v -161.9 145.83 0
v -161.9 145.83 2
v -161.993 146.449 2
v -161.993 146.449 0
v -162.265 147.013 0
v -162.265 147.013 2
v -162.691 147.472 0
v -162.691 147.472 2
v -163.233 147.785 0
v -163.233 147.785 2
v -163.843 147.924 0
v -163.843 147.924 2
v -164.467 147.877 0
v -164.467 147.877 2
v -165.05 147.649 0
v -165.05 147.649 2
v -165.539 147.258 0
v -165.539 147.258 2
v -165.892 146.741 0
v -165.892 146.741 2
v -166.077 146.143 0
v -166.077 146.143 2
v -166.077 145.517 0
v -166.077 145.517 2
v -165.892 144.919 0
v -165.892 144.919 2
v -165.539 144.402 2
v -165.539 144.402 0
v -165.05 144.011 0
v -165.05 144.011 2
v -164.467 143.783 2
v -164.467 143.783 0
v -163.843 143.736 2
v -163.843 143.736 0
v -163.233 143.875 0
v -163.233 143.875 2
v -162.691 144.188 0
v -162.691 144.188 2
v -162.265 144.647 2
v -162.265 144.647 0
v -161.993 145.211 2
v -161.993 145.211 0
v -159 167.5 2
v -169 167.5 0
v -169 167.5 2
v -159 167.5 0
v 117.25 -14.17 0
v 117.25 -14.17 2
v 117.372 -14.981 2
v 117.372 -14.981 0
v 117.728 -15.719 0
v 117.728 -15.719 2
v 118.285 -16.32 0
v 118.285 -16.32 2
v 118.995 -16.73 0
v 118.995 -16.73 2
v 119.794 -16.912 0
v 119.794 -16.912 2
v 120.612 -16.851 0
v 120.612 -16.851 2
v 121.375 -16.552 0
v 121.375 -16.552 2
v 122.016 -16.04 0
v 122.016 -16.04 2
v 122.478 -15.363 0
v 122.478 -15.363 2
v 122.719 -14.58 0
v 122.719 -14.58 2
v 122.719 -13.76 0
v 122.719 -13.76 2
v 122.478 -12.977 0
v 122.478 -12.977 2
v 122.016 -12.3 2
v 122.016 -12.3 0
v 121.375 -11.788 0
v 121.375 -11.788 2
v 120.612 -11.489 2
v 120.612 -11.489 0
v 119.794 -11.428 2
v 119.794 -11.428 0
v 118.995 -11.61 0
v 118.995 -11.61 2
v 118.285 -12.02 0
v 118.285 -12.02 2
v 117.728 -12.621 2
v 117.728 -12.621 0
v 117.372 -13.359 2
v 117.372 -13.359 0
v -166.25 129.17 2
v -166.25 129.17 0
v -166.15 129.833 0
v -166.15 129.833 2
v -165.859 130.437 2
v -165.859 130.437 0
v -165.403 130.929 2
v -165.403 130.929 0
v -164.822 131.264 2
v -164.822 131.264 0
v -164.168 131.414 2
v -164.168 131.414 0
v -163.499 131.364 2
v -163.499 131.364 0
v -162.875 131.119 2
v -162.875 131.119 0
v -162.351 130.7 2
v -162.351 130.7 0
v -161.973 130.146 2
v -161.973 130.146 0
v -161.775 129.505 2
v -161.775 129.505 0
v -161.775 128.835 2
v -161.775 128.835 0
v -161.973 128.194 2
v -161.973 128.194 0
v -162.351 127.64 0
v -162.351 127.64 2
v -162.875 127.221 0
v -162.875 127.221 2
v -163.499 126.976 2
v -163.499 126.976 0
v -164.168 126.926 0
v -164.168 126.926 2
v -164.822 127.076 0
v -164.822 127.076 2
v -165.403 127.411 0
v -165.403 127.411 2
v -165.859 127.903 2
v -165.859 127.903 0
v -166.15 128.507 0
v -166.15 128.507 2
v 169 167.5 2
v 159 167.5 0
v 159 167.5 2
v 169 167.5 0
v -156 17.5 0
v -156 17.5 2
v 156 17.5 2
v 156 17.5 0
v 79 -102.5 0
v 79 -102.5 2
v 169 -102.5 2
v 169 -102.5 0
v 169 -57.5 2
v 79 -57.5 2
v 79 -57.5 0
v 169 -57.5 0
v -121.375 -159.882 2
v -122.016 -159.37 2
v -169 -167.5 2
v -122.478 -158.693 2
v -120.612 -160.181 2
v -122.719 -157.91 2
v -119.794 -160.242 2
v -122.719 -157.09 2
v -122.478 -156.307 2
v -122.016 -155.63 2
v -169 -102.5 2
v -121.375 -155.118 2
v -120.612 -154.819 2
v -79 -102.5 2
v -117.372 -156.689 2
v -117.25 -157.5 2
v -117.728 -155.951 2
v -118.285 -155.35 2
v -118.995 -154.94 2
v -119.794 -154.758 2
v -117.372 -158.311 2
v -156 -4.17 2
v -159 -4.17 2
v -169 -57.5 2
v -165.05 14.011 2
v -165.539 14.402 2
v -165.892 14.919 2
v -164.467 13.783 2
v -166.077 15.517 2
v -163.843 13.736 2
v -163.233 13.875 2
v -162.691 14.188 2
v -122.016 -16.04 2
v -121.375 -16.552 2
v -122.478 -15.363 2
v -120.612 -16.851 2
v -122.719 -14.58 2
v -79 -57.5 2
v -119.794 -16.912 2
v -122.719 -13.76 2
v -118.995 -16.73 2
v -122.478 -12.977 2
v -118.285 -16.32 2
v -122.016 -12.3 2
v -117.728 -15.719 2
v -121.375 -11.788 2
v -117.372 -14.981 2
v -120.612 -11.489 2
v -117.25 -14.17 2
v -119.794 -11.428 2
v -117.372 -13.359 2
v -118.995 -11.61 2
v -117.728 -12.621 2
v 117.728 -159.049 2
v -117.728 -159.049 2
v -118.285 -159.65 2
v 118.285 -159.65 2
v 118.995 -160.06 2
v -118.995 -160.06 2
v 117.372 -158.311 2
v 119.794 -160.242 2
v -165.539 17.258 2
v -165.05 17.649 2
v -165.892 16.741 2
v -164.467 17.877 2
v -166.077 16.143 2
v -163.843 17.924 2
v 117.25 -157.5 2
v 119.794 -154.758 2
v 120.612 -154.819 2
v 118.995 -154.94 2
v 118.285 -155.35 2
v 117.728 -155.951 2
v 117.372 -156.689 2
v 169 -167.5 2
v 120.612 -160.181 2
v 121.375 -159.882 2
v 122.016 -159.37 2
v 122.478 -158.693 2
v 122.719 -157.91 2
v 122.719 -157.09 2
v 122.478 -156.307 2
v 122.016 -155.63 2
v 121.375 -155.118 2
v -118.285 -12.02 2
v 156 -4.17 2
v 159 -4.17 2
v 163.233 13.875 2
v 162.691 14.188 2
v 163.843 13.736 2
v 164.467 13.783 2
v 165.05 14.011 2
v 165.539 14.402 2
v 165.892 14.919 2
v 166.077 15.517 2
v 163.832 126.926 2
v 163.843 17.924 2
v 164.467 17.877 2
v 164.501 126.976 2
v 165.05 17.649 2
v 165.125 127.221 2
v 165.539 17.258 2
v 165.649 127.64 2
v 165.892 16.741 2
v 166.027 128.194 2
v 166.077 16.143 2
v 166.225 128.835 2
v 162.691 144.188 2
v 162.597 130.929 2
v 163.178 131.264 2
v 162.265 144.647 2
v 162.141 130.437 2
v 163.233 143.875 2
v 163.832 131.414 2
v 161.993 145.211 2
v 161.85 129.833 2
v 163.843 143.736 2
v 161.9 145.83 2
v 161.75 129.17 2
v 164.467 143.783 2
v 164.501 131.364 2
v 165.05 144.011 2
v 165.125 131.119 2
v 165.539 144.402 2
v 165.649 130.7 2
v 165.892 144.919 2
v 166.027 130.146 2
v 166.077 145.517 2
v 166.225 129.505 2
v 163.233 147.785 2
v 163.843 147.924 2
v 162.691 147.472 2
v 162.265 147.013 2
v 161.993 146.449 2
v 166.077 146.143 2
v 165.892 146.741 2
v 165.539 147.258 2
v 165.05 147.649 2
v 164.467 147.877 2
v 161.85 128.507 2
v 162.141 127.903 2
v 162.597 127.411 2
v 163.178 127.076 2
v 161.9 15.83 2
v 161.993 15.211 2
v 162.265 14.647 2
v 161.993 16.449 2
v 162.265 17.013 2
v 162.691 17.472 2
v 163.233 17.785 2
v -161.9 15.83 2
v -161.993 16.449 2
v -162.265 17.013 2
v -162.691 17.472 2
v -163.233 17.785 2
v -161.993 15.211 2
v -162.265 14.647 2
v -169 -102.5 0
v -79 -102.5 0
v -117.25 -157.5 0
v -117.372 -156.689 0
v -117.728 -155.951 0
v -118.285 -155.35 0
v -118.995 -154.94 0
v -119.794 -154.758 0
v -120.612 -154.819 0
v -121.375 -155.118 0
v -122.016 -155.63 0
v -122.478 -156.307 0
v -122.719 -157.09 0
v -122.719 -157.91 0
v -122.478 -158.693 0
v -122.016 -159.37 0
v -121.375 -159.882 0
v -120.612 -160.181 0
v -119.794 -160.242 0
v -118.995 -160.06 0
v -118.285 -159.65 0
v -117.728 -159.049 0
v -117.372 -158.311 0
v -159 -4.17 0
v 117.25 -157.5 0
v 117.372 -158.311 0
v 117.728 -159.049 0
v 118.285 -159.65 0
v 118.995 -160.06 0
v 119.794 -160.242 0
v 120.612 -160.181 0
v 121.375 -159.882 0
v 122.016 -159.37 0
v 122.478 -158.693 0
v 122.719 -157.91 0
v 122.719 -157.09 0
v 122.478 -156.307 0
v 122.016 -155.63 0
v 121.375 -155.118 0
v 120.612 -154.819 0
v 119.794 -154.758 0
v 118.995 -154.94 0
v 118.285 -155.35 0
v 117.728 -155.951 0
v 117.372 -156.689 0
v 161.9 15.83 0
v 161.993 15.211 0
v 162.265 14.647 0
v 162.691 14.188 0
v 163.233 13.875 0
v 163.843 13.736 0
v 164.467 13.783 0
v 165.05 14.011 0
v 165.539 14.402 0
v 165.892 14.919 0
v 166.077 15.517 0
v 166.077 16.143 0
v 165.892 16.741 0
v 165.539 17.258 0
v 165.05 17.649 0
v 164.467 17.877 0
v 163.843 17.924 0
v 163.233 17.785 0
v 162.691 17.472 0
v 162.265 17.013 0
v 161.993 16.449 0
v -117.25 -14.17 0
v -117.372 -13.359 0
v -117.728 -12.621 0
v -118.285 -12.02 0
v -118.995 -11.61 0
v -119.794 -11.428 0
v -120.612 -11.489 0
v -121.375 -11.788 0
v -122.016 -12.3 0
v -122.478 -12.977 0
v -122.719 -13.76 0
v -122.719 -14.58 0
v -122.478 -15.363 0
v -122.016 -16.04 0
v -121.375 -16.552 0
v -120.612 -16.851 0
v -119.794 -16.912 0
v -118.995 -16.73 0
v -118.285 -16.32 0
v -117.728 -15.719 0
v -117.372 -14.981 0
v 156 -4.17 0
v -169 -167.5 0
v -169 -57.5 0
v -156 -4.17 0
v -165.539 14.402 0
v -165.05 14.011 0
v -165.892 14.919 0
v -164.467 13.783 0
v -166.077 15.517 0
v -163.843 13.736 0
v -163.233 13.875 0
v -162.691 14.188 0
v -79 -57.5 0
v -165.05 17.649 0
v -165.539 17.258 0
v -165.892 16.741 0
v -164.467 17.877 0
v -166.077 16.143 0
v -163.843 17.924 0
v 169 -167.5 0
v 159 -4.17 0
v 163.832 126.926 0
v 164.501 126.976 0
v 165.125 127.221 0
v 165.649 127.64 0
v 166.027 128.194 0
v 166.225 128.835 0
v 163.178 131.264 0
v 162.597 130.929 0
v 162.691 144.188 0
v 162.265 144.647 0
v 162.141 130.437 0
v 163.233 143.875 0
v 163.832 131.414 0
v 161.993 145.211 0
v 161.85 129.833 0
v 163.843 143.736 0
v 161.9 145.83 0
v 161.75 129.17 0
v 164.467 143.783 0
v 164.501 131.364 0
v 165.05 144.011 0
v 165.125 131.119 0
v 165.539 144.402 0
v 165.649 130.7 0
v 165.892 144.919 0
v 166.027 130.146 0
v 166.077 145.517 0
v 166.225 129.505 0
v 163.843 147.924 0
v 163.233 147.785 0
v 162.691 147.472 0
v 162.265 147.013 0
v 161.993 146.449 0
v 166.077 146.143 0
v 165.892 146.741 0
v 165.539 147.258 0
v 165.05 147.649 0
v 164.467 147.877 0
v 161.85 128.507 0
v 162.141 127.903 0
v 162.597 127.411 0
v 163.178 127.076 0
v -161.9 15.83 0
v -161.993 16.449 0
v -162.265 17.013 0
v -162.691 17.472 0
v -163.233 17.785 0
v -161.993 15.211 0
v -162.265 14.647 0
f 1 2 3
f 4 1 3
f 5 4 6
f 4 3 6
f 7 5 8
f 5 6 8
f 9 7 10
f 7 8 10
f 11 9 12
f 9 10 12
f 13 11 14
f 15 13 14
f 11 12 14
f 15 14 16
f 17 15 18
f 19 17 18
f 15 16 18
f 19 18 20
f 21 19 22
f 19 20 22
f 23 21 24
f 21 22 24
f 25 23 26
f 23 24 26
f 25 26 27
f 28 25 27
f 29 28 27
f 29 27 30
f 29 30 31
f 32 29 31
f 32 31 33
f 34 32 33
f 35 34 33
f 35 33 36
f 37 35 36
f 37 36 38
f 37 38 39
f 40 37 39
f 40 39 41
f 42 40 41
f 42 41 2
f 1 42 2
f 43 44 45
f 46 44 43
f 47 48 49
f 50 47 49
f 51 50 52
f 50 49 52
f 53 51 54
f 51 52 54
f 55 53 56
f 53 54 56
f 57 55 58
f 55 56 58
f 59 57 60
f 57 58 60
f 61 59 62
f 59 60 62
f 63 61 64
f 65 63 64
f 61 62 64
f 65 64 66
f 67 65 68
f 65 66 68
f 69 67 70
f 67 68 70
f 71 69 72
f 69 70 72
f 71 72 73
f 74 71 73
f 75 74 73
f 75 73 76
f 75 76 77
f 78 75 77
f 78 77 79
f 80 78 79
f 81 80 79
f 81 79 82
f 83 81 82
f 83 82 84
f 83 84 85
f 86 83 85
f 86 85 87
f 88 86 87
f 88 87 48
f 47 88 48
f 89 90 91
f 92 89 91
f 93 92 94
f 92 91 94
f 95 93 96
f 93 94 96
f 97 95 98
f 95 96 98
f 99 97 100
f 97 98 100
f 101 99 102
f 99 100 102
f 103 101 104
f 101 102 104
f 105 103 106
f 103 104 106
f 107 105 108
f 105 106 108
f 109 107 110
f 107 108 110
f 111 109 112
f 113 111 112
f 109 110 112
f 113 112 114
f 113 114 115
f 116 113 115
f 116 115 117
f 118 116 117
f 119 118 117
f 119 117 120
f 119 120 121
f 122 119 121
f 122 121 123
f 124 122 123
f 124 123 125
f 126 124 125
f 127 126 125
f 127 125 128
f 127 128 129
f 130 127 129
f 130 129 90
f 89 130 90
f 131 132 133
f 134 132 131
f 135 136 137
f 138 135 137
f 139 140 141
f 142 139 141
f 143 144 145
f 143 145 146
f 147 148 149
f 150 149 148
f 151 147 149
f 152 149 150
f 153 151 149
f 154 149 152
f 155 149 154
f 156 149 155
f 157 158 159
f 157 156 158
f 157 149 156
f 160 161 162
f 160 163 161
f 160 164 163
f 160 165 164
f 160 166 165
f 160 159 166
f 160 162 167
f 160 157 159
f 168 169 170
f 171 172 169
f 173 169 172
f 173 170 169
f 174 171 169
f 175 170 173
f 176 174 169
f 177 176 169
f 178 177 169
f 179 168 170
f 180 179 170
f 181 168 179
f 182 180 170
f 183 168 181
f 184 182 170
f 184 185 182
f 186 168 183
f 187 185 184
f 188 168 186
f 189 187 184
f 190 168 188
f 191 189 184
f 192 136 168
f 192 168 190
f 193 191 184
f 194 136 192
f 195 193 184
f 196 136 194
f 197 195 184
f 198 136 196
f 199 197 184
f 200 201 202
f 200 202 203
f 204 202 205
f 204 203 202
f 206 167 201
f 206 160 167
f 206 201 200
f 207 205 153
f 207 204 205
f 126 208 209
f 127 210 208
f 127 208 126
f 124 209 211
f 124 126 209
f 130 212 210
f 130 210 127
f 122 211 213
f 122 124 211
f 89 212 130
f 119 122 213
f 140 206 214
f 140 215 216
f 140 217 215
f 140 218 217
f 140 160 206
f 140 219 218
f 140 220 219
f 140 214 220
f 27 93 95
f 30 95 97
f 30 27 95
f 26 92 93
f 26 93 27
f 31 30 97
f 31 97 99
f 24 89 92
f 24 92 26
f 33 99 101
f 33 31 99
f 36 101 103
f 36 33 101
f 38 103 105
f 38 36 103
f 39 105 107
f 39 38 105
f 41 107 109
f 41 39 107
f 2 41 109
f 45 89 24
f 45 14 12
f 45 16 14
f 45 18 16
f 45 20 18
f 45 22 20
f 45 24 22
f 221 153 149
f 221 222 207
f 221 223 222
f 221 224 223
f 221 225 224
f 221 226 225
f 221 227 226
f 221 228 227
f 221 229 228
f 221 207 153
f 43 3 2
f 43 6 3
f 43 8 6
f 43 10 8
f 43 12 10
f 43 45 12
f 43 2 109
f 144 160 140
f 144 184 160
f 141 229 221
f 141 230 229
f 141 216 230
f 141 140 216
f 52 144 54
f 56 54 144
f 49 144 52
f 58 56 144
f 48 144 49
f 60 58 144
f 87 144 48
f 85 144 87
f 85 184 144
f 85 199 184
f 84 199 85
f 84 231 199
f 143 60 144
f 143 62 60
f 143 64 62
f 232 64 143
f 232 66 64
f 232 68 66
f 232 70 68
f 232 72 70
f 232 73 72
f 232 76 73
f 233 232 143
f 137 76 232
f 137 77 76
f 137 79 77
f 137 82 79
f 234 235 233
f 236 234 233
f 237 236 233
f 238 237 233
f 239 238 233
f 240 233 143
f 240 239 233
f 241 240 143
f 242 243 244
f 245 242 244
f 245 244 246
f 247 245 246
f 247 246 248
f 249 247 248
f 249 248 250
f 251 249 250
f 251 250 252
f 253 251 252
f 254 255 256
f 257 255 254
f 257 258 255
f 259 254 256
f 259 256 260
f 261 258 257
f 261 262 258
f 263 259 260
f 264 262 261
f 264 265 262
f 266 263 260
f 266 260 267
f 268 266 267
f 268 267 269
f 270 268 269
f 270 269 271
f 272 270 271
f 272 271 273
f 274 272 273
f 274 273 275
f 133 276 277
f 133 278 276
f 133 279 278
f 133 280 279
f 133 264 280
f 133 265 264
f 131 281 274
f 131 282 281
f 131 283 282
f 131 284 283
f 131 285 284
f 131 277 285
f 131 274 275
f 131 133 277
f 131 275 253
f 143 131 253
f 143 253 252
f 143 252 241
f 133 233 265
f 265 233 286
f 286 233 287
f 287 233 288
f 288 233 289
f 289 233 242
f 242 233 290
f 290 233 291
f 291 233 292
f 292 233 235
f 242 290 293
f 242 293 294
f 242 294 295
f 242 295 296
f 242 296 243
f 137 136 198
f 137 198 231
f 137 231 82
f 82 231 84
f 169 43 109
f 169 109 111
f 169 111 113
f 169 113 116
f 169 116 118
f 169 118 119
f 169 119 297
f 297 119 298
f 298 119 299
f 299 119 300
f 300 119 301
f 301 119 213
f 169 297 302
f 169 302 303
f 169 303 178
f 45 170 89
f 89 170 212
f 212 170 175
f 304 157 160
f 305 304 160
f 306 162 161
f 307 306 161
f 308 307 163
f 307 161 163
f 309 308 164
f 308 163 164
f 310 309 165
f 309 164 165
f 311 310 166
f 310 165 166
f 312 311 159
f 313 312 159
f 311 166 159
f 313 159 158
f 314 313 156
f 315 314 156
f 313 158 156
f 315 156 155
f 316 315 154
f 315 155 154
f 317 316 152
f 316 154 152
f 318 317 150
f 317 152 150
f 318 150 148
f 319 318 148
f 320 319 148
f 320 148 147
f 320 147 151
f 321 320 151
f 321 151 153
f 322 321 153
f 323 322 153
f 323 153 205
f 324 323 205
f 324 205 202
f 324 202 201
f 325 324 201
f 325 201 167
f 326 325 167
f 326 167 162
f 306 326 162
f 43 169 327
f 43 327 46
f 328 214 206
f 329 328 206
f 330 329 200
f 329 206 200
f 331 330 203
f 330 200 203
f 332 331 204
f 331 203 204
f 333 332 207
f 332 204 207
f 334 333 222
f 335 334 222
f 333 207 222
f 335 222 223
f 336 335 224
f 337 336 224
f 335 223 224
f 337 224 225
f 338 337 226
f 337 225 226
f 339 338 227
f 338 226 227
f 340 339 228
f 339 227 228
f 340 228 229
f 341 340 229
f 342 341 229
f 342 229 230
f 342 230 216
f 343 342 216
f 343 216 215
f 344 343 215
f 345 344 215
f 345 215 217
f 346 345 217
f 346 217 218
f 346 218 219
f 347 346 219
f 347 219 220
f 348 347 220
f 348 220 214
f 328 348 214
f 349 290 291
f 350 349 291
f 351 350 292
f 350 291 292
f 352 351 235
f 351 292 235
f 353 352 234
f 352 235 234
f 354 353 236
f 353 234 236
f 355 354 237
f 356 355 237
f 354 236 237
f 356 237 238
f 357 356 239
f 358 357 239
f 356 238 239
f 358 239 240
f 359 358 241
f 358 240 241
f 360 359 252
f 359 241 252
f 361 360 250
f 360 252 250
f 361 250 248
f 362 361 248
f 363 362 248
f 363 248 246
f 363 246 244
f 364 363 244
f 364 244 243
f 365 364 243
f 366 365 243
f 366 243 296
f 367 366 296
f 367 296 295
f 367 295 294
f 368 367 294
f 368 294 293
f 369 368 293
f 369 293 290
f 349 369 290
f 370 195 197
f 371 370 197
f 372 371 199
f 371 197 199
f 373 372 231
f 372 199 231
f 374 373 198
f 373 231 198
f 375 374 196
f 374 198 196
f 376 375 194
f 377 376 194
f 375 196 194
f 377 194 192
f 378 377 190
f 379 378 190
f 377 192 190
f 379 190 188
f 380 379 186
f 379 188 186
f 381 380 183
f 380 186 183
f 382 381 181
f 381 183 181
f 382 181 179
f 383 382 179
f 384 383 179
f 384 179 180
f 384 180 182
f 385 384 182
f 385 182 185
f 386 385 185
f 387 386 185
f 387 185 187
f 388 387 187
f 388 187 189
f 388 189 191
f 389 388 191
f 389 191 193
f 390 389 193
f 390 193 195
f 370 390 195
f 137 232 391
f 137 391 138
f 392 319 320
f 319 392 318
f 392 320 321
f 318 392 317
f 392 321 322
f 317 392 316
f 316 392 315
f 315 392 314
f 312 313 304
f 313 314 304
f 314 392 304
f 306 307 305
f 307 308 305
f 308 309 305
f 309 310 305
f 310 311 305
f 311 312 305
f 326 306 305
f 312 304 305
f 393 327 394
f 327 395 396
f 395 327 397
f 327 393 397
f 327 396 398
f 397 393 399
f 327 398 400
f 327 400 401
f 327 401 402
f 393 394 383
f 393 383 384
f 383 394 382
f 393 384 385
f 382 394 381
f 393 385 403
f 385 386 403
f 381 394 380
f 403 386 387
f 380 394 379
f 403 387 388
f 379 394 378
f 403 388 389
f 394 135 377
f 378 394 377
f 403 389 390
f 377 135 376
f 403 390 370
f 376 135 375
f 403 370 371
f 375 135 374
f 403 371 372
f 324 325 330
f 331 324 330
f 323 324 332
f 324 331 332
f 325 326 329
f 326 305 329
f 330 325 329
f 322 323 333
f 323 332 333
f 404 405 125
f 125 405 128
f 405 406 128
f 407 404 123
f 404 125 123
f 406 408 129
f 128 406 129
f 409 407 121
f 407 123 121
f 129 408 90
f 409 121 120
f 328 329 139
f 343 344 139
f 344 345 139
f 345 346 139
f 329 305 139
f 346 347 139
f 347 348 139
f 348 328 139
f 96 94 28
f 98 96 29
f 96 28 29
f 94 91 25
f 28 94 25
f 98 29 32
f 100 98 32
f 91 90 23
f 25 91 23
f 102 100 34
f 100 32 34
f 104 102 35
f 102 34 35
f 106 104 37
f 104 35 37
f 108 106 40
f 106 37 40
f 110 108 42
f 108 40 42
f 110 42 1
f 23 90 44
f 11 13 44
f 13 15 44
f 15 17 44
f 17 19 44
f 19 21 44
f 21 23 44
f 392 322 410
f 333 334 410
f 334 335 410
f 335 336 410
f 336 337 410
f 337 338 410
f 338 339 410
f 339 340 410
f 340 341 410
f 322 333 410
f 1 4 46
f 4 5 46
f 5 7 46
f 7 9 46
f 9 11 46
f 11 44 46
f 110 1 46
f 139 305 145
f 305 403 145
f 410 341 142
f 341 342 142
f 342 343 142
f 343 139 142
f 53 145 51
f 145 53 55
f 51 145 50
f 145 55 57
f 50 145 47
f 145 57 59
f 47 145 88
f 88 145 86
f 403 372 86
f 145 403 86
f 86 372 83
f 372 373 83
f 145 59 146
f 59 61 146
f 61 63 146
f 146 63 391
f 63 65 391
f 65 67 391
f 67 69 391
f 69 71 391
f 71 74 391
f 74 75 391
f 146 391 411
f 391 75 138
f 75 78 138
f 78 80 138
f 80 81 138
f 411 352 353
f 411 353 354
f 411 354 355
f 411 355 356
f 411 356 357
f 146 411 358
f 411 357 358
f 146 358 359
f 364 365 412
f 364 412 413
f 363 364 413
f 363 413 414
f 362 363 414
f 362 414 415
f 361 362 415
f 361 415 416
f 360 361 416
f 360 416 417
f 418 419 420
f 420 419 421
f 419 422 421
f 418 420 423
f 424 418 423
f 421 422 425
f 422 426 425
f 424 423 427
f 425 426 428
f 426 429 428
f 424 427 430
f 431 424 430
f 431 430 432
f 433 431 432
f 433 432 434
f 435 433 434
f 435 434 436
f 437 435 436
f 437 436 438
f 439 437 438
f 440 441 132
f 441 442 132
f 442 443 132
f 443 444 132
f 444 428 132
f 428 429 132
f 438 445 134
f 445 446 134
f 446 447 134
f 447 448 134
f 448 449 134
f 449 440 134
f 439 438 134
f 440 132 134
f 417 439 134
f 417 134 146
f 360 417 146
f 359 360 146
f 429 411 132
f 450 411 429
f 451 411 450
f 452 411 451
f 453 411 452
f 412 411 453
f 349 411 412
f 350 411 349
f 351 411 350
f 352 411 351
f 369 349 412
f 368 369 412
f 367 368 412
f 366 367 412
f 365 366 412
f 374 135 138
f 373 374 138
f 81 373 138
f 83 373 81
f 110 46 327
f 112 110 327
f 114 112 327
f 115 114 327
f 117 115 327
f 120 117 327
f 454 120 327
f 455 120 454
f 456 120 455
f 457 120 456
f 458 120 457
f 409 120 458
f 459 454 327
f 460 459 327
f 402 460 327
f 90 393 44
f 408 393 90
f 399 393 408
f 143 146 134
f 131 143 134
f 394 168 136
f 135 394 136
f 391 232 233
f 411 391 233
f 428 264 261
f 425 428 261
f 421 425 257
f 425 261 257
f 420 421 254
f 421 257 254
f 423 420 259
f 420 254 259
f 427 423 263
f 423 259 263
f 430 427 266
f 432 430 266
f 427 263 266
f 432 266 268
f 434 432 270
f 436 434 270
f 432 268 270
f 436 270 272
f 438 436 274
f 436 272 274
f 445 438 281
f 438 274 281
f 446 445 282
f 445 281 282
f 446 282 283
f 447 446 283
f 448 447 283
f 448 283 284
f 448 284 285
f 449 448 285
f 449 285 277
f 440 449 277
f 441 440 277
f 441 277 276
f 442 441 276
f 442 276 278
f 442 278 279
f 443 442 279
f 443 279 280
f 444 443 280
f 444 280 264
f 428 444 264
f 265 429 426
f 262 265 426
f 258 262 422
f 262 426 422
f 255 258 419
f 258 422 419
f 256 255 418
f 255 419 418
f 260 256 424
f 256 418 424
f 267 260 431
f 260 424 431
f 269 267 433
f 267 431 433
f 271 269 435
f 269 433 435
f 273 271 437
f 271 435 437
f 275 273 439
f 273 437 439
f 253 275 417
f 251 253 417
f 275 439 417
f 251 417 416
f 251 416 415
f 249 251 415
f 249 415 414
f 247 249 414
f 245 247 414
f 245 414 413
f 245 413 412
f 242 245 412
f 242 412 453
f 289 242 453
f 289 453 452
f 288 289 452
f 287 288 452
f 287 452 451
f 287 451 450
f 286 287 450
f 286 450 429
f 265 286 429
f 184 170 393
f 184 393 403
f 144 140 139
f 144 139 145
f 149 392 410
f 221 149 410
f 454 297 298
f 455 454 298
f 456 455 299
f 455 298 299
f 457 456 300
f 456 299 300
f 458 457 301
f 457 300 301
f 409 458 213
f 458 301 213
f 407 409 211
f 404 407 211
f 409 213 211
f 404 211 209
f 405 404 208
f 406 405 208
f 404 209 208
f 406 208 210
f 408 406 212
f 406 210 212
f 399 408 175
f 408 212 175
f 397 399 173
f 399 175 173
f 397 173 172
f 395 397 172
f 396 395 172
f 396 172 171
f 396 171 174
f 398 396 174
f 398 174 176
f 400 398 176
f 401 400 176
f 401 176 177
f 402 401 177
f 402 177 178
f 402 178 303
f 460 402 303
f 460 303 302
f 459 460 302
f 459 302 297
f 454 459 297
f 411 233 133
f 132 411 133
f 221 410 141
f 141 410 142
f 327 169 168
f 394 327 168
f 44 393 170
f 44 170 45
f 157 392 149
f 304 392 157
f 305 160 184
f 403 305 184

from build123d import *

# Parameters (mm, degrees)
ESQUISSE1_W             = 338
ESQUISSE1_H             = 335
BOSS_EXTRU_1_DEPTH      = 2
ESQUISSE2_W             = 318
ESQUISSE2_H             = 150
ESQUISSE2_W_2           = 90
ESQUISSE2_H_2           = 45
ENL_V_MAT_EXTRU_1_DEPTH = 238.952201082
D_GAGEMENT_M41_D        = 4.5
ESQUISSE5_W             = 3
ESQUISSE5_H             = 21.67
ENL_V_MAT_EXTRU_2_DEPTH = 238.952201082
ESQUISSE6_R             = 2.1
ENL_V_MAT_EXTRU_3_DEPTH = 238.952201082
ESQUISSE7_R             = 2.75
ENL_V_MAT_EXTRU_4_DEPTH = 238.952201082


with BuildPart() as part:
    # Esquisse1 → Boss.-Extru.1 (new body)
    with BuildSketch(Plane.XY):
        Rectangle(ESQUISSE1_W, ESQUISSE1_H)
    extrude(amount=BOSS_EXTRU_1_DEPTH)

    # Esquisse2 → Enlèv. mat.-Extru.1 (cut, through all)
    with BuildSketch(Plane.XY.offset(2)):
        with Locations((0, 92.5)):
            Rectangle(ESQUISSE2_W, ESQUISSE2_H)
        with Locations((124, -80)):
            Rectangle(ESQUISSE2_W_2, ESQUISSE2_H_2)
        with Locations((-124, -80)):
            Rectangle(ESQUISSE2_W_2, ESQUISSE2_H_2)
    extrude(amount=-ENL_V_MAT_EXTRU_1_DEPTH, mode=Mode.SUBTRACT)

    # Dégagement M41 (through all)
    with Locations(Plane.XY.offset(2)):
        with Locations((164, 129.17), (-164, 129.17)):
            Hole(D_GAGEMENT_M41_D / 2)

    # Esquisse5 → Enlèv. mat.-Extru.2 (cut, through all)
    with BuildSketch(Plane.XY.offset(2)):
        with Locations((157.5, 6.665)):
            Rectangle(ESQUISSE5_W, ESQUISSE5_H)
        with Locations((-157.5, 6.665)):
            Rectangle(ESQUISSE5_W, ESQUISSE5_H)
    extrude(amount=-ENL_V_MAT_EXTRU_2_DEPTH, mode=Mode.SUBTRACT)

    # Esquisse6 → Enlèv. mat.-Extru.3 (cut, through all)
    with BuildSketch(Plane.XY.offset(2)):
        with Locations((-164, 15.83)):
            Circle(ESQUISSE6_R)
        with Locations((-164, 145.83)):
            Circle(ESQUISSE6_R)
        with Locations(Location((164, 15.83, 0), (0, 0, 180))):
            Circle(ESQUISSE6_R)
        with Locations(Location((164, 145.83, 0), (0, 0, 180))):
            Circle(ESQUISSE6_R)
    extrude(amount=-ENL_V_MAT_EXTRU_3_DEPTH, mode=Mode.SUBTRACT)

    # Esquisse7 → Enlèv. mat.-Extru.4 (cut, through all)
    with BuildSketch(Plane.XY.offset(2)):
        with Locations((-120, -157.5)):
            Circle(ESQUISSE7_R)
        with Locations((-120, -14.17)):
            Circle(ESQUISSE7_R)
        with Locations(Location((120, -14.17, 0), (0, 0, 180))):
            Circle(ESQUISSE7_R)
        with Locations(Location((120, -157.5, 0), (0, 0, 180))):
            Circle(ESQUISSE7_R)
    extrude(amount=-ENL_V_MAT_EXTRU_4_DEPTH, mode=Mode.SUBTRACT)


solid = part.part
